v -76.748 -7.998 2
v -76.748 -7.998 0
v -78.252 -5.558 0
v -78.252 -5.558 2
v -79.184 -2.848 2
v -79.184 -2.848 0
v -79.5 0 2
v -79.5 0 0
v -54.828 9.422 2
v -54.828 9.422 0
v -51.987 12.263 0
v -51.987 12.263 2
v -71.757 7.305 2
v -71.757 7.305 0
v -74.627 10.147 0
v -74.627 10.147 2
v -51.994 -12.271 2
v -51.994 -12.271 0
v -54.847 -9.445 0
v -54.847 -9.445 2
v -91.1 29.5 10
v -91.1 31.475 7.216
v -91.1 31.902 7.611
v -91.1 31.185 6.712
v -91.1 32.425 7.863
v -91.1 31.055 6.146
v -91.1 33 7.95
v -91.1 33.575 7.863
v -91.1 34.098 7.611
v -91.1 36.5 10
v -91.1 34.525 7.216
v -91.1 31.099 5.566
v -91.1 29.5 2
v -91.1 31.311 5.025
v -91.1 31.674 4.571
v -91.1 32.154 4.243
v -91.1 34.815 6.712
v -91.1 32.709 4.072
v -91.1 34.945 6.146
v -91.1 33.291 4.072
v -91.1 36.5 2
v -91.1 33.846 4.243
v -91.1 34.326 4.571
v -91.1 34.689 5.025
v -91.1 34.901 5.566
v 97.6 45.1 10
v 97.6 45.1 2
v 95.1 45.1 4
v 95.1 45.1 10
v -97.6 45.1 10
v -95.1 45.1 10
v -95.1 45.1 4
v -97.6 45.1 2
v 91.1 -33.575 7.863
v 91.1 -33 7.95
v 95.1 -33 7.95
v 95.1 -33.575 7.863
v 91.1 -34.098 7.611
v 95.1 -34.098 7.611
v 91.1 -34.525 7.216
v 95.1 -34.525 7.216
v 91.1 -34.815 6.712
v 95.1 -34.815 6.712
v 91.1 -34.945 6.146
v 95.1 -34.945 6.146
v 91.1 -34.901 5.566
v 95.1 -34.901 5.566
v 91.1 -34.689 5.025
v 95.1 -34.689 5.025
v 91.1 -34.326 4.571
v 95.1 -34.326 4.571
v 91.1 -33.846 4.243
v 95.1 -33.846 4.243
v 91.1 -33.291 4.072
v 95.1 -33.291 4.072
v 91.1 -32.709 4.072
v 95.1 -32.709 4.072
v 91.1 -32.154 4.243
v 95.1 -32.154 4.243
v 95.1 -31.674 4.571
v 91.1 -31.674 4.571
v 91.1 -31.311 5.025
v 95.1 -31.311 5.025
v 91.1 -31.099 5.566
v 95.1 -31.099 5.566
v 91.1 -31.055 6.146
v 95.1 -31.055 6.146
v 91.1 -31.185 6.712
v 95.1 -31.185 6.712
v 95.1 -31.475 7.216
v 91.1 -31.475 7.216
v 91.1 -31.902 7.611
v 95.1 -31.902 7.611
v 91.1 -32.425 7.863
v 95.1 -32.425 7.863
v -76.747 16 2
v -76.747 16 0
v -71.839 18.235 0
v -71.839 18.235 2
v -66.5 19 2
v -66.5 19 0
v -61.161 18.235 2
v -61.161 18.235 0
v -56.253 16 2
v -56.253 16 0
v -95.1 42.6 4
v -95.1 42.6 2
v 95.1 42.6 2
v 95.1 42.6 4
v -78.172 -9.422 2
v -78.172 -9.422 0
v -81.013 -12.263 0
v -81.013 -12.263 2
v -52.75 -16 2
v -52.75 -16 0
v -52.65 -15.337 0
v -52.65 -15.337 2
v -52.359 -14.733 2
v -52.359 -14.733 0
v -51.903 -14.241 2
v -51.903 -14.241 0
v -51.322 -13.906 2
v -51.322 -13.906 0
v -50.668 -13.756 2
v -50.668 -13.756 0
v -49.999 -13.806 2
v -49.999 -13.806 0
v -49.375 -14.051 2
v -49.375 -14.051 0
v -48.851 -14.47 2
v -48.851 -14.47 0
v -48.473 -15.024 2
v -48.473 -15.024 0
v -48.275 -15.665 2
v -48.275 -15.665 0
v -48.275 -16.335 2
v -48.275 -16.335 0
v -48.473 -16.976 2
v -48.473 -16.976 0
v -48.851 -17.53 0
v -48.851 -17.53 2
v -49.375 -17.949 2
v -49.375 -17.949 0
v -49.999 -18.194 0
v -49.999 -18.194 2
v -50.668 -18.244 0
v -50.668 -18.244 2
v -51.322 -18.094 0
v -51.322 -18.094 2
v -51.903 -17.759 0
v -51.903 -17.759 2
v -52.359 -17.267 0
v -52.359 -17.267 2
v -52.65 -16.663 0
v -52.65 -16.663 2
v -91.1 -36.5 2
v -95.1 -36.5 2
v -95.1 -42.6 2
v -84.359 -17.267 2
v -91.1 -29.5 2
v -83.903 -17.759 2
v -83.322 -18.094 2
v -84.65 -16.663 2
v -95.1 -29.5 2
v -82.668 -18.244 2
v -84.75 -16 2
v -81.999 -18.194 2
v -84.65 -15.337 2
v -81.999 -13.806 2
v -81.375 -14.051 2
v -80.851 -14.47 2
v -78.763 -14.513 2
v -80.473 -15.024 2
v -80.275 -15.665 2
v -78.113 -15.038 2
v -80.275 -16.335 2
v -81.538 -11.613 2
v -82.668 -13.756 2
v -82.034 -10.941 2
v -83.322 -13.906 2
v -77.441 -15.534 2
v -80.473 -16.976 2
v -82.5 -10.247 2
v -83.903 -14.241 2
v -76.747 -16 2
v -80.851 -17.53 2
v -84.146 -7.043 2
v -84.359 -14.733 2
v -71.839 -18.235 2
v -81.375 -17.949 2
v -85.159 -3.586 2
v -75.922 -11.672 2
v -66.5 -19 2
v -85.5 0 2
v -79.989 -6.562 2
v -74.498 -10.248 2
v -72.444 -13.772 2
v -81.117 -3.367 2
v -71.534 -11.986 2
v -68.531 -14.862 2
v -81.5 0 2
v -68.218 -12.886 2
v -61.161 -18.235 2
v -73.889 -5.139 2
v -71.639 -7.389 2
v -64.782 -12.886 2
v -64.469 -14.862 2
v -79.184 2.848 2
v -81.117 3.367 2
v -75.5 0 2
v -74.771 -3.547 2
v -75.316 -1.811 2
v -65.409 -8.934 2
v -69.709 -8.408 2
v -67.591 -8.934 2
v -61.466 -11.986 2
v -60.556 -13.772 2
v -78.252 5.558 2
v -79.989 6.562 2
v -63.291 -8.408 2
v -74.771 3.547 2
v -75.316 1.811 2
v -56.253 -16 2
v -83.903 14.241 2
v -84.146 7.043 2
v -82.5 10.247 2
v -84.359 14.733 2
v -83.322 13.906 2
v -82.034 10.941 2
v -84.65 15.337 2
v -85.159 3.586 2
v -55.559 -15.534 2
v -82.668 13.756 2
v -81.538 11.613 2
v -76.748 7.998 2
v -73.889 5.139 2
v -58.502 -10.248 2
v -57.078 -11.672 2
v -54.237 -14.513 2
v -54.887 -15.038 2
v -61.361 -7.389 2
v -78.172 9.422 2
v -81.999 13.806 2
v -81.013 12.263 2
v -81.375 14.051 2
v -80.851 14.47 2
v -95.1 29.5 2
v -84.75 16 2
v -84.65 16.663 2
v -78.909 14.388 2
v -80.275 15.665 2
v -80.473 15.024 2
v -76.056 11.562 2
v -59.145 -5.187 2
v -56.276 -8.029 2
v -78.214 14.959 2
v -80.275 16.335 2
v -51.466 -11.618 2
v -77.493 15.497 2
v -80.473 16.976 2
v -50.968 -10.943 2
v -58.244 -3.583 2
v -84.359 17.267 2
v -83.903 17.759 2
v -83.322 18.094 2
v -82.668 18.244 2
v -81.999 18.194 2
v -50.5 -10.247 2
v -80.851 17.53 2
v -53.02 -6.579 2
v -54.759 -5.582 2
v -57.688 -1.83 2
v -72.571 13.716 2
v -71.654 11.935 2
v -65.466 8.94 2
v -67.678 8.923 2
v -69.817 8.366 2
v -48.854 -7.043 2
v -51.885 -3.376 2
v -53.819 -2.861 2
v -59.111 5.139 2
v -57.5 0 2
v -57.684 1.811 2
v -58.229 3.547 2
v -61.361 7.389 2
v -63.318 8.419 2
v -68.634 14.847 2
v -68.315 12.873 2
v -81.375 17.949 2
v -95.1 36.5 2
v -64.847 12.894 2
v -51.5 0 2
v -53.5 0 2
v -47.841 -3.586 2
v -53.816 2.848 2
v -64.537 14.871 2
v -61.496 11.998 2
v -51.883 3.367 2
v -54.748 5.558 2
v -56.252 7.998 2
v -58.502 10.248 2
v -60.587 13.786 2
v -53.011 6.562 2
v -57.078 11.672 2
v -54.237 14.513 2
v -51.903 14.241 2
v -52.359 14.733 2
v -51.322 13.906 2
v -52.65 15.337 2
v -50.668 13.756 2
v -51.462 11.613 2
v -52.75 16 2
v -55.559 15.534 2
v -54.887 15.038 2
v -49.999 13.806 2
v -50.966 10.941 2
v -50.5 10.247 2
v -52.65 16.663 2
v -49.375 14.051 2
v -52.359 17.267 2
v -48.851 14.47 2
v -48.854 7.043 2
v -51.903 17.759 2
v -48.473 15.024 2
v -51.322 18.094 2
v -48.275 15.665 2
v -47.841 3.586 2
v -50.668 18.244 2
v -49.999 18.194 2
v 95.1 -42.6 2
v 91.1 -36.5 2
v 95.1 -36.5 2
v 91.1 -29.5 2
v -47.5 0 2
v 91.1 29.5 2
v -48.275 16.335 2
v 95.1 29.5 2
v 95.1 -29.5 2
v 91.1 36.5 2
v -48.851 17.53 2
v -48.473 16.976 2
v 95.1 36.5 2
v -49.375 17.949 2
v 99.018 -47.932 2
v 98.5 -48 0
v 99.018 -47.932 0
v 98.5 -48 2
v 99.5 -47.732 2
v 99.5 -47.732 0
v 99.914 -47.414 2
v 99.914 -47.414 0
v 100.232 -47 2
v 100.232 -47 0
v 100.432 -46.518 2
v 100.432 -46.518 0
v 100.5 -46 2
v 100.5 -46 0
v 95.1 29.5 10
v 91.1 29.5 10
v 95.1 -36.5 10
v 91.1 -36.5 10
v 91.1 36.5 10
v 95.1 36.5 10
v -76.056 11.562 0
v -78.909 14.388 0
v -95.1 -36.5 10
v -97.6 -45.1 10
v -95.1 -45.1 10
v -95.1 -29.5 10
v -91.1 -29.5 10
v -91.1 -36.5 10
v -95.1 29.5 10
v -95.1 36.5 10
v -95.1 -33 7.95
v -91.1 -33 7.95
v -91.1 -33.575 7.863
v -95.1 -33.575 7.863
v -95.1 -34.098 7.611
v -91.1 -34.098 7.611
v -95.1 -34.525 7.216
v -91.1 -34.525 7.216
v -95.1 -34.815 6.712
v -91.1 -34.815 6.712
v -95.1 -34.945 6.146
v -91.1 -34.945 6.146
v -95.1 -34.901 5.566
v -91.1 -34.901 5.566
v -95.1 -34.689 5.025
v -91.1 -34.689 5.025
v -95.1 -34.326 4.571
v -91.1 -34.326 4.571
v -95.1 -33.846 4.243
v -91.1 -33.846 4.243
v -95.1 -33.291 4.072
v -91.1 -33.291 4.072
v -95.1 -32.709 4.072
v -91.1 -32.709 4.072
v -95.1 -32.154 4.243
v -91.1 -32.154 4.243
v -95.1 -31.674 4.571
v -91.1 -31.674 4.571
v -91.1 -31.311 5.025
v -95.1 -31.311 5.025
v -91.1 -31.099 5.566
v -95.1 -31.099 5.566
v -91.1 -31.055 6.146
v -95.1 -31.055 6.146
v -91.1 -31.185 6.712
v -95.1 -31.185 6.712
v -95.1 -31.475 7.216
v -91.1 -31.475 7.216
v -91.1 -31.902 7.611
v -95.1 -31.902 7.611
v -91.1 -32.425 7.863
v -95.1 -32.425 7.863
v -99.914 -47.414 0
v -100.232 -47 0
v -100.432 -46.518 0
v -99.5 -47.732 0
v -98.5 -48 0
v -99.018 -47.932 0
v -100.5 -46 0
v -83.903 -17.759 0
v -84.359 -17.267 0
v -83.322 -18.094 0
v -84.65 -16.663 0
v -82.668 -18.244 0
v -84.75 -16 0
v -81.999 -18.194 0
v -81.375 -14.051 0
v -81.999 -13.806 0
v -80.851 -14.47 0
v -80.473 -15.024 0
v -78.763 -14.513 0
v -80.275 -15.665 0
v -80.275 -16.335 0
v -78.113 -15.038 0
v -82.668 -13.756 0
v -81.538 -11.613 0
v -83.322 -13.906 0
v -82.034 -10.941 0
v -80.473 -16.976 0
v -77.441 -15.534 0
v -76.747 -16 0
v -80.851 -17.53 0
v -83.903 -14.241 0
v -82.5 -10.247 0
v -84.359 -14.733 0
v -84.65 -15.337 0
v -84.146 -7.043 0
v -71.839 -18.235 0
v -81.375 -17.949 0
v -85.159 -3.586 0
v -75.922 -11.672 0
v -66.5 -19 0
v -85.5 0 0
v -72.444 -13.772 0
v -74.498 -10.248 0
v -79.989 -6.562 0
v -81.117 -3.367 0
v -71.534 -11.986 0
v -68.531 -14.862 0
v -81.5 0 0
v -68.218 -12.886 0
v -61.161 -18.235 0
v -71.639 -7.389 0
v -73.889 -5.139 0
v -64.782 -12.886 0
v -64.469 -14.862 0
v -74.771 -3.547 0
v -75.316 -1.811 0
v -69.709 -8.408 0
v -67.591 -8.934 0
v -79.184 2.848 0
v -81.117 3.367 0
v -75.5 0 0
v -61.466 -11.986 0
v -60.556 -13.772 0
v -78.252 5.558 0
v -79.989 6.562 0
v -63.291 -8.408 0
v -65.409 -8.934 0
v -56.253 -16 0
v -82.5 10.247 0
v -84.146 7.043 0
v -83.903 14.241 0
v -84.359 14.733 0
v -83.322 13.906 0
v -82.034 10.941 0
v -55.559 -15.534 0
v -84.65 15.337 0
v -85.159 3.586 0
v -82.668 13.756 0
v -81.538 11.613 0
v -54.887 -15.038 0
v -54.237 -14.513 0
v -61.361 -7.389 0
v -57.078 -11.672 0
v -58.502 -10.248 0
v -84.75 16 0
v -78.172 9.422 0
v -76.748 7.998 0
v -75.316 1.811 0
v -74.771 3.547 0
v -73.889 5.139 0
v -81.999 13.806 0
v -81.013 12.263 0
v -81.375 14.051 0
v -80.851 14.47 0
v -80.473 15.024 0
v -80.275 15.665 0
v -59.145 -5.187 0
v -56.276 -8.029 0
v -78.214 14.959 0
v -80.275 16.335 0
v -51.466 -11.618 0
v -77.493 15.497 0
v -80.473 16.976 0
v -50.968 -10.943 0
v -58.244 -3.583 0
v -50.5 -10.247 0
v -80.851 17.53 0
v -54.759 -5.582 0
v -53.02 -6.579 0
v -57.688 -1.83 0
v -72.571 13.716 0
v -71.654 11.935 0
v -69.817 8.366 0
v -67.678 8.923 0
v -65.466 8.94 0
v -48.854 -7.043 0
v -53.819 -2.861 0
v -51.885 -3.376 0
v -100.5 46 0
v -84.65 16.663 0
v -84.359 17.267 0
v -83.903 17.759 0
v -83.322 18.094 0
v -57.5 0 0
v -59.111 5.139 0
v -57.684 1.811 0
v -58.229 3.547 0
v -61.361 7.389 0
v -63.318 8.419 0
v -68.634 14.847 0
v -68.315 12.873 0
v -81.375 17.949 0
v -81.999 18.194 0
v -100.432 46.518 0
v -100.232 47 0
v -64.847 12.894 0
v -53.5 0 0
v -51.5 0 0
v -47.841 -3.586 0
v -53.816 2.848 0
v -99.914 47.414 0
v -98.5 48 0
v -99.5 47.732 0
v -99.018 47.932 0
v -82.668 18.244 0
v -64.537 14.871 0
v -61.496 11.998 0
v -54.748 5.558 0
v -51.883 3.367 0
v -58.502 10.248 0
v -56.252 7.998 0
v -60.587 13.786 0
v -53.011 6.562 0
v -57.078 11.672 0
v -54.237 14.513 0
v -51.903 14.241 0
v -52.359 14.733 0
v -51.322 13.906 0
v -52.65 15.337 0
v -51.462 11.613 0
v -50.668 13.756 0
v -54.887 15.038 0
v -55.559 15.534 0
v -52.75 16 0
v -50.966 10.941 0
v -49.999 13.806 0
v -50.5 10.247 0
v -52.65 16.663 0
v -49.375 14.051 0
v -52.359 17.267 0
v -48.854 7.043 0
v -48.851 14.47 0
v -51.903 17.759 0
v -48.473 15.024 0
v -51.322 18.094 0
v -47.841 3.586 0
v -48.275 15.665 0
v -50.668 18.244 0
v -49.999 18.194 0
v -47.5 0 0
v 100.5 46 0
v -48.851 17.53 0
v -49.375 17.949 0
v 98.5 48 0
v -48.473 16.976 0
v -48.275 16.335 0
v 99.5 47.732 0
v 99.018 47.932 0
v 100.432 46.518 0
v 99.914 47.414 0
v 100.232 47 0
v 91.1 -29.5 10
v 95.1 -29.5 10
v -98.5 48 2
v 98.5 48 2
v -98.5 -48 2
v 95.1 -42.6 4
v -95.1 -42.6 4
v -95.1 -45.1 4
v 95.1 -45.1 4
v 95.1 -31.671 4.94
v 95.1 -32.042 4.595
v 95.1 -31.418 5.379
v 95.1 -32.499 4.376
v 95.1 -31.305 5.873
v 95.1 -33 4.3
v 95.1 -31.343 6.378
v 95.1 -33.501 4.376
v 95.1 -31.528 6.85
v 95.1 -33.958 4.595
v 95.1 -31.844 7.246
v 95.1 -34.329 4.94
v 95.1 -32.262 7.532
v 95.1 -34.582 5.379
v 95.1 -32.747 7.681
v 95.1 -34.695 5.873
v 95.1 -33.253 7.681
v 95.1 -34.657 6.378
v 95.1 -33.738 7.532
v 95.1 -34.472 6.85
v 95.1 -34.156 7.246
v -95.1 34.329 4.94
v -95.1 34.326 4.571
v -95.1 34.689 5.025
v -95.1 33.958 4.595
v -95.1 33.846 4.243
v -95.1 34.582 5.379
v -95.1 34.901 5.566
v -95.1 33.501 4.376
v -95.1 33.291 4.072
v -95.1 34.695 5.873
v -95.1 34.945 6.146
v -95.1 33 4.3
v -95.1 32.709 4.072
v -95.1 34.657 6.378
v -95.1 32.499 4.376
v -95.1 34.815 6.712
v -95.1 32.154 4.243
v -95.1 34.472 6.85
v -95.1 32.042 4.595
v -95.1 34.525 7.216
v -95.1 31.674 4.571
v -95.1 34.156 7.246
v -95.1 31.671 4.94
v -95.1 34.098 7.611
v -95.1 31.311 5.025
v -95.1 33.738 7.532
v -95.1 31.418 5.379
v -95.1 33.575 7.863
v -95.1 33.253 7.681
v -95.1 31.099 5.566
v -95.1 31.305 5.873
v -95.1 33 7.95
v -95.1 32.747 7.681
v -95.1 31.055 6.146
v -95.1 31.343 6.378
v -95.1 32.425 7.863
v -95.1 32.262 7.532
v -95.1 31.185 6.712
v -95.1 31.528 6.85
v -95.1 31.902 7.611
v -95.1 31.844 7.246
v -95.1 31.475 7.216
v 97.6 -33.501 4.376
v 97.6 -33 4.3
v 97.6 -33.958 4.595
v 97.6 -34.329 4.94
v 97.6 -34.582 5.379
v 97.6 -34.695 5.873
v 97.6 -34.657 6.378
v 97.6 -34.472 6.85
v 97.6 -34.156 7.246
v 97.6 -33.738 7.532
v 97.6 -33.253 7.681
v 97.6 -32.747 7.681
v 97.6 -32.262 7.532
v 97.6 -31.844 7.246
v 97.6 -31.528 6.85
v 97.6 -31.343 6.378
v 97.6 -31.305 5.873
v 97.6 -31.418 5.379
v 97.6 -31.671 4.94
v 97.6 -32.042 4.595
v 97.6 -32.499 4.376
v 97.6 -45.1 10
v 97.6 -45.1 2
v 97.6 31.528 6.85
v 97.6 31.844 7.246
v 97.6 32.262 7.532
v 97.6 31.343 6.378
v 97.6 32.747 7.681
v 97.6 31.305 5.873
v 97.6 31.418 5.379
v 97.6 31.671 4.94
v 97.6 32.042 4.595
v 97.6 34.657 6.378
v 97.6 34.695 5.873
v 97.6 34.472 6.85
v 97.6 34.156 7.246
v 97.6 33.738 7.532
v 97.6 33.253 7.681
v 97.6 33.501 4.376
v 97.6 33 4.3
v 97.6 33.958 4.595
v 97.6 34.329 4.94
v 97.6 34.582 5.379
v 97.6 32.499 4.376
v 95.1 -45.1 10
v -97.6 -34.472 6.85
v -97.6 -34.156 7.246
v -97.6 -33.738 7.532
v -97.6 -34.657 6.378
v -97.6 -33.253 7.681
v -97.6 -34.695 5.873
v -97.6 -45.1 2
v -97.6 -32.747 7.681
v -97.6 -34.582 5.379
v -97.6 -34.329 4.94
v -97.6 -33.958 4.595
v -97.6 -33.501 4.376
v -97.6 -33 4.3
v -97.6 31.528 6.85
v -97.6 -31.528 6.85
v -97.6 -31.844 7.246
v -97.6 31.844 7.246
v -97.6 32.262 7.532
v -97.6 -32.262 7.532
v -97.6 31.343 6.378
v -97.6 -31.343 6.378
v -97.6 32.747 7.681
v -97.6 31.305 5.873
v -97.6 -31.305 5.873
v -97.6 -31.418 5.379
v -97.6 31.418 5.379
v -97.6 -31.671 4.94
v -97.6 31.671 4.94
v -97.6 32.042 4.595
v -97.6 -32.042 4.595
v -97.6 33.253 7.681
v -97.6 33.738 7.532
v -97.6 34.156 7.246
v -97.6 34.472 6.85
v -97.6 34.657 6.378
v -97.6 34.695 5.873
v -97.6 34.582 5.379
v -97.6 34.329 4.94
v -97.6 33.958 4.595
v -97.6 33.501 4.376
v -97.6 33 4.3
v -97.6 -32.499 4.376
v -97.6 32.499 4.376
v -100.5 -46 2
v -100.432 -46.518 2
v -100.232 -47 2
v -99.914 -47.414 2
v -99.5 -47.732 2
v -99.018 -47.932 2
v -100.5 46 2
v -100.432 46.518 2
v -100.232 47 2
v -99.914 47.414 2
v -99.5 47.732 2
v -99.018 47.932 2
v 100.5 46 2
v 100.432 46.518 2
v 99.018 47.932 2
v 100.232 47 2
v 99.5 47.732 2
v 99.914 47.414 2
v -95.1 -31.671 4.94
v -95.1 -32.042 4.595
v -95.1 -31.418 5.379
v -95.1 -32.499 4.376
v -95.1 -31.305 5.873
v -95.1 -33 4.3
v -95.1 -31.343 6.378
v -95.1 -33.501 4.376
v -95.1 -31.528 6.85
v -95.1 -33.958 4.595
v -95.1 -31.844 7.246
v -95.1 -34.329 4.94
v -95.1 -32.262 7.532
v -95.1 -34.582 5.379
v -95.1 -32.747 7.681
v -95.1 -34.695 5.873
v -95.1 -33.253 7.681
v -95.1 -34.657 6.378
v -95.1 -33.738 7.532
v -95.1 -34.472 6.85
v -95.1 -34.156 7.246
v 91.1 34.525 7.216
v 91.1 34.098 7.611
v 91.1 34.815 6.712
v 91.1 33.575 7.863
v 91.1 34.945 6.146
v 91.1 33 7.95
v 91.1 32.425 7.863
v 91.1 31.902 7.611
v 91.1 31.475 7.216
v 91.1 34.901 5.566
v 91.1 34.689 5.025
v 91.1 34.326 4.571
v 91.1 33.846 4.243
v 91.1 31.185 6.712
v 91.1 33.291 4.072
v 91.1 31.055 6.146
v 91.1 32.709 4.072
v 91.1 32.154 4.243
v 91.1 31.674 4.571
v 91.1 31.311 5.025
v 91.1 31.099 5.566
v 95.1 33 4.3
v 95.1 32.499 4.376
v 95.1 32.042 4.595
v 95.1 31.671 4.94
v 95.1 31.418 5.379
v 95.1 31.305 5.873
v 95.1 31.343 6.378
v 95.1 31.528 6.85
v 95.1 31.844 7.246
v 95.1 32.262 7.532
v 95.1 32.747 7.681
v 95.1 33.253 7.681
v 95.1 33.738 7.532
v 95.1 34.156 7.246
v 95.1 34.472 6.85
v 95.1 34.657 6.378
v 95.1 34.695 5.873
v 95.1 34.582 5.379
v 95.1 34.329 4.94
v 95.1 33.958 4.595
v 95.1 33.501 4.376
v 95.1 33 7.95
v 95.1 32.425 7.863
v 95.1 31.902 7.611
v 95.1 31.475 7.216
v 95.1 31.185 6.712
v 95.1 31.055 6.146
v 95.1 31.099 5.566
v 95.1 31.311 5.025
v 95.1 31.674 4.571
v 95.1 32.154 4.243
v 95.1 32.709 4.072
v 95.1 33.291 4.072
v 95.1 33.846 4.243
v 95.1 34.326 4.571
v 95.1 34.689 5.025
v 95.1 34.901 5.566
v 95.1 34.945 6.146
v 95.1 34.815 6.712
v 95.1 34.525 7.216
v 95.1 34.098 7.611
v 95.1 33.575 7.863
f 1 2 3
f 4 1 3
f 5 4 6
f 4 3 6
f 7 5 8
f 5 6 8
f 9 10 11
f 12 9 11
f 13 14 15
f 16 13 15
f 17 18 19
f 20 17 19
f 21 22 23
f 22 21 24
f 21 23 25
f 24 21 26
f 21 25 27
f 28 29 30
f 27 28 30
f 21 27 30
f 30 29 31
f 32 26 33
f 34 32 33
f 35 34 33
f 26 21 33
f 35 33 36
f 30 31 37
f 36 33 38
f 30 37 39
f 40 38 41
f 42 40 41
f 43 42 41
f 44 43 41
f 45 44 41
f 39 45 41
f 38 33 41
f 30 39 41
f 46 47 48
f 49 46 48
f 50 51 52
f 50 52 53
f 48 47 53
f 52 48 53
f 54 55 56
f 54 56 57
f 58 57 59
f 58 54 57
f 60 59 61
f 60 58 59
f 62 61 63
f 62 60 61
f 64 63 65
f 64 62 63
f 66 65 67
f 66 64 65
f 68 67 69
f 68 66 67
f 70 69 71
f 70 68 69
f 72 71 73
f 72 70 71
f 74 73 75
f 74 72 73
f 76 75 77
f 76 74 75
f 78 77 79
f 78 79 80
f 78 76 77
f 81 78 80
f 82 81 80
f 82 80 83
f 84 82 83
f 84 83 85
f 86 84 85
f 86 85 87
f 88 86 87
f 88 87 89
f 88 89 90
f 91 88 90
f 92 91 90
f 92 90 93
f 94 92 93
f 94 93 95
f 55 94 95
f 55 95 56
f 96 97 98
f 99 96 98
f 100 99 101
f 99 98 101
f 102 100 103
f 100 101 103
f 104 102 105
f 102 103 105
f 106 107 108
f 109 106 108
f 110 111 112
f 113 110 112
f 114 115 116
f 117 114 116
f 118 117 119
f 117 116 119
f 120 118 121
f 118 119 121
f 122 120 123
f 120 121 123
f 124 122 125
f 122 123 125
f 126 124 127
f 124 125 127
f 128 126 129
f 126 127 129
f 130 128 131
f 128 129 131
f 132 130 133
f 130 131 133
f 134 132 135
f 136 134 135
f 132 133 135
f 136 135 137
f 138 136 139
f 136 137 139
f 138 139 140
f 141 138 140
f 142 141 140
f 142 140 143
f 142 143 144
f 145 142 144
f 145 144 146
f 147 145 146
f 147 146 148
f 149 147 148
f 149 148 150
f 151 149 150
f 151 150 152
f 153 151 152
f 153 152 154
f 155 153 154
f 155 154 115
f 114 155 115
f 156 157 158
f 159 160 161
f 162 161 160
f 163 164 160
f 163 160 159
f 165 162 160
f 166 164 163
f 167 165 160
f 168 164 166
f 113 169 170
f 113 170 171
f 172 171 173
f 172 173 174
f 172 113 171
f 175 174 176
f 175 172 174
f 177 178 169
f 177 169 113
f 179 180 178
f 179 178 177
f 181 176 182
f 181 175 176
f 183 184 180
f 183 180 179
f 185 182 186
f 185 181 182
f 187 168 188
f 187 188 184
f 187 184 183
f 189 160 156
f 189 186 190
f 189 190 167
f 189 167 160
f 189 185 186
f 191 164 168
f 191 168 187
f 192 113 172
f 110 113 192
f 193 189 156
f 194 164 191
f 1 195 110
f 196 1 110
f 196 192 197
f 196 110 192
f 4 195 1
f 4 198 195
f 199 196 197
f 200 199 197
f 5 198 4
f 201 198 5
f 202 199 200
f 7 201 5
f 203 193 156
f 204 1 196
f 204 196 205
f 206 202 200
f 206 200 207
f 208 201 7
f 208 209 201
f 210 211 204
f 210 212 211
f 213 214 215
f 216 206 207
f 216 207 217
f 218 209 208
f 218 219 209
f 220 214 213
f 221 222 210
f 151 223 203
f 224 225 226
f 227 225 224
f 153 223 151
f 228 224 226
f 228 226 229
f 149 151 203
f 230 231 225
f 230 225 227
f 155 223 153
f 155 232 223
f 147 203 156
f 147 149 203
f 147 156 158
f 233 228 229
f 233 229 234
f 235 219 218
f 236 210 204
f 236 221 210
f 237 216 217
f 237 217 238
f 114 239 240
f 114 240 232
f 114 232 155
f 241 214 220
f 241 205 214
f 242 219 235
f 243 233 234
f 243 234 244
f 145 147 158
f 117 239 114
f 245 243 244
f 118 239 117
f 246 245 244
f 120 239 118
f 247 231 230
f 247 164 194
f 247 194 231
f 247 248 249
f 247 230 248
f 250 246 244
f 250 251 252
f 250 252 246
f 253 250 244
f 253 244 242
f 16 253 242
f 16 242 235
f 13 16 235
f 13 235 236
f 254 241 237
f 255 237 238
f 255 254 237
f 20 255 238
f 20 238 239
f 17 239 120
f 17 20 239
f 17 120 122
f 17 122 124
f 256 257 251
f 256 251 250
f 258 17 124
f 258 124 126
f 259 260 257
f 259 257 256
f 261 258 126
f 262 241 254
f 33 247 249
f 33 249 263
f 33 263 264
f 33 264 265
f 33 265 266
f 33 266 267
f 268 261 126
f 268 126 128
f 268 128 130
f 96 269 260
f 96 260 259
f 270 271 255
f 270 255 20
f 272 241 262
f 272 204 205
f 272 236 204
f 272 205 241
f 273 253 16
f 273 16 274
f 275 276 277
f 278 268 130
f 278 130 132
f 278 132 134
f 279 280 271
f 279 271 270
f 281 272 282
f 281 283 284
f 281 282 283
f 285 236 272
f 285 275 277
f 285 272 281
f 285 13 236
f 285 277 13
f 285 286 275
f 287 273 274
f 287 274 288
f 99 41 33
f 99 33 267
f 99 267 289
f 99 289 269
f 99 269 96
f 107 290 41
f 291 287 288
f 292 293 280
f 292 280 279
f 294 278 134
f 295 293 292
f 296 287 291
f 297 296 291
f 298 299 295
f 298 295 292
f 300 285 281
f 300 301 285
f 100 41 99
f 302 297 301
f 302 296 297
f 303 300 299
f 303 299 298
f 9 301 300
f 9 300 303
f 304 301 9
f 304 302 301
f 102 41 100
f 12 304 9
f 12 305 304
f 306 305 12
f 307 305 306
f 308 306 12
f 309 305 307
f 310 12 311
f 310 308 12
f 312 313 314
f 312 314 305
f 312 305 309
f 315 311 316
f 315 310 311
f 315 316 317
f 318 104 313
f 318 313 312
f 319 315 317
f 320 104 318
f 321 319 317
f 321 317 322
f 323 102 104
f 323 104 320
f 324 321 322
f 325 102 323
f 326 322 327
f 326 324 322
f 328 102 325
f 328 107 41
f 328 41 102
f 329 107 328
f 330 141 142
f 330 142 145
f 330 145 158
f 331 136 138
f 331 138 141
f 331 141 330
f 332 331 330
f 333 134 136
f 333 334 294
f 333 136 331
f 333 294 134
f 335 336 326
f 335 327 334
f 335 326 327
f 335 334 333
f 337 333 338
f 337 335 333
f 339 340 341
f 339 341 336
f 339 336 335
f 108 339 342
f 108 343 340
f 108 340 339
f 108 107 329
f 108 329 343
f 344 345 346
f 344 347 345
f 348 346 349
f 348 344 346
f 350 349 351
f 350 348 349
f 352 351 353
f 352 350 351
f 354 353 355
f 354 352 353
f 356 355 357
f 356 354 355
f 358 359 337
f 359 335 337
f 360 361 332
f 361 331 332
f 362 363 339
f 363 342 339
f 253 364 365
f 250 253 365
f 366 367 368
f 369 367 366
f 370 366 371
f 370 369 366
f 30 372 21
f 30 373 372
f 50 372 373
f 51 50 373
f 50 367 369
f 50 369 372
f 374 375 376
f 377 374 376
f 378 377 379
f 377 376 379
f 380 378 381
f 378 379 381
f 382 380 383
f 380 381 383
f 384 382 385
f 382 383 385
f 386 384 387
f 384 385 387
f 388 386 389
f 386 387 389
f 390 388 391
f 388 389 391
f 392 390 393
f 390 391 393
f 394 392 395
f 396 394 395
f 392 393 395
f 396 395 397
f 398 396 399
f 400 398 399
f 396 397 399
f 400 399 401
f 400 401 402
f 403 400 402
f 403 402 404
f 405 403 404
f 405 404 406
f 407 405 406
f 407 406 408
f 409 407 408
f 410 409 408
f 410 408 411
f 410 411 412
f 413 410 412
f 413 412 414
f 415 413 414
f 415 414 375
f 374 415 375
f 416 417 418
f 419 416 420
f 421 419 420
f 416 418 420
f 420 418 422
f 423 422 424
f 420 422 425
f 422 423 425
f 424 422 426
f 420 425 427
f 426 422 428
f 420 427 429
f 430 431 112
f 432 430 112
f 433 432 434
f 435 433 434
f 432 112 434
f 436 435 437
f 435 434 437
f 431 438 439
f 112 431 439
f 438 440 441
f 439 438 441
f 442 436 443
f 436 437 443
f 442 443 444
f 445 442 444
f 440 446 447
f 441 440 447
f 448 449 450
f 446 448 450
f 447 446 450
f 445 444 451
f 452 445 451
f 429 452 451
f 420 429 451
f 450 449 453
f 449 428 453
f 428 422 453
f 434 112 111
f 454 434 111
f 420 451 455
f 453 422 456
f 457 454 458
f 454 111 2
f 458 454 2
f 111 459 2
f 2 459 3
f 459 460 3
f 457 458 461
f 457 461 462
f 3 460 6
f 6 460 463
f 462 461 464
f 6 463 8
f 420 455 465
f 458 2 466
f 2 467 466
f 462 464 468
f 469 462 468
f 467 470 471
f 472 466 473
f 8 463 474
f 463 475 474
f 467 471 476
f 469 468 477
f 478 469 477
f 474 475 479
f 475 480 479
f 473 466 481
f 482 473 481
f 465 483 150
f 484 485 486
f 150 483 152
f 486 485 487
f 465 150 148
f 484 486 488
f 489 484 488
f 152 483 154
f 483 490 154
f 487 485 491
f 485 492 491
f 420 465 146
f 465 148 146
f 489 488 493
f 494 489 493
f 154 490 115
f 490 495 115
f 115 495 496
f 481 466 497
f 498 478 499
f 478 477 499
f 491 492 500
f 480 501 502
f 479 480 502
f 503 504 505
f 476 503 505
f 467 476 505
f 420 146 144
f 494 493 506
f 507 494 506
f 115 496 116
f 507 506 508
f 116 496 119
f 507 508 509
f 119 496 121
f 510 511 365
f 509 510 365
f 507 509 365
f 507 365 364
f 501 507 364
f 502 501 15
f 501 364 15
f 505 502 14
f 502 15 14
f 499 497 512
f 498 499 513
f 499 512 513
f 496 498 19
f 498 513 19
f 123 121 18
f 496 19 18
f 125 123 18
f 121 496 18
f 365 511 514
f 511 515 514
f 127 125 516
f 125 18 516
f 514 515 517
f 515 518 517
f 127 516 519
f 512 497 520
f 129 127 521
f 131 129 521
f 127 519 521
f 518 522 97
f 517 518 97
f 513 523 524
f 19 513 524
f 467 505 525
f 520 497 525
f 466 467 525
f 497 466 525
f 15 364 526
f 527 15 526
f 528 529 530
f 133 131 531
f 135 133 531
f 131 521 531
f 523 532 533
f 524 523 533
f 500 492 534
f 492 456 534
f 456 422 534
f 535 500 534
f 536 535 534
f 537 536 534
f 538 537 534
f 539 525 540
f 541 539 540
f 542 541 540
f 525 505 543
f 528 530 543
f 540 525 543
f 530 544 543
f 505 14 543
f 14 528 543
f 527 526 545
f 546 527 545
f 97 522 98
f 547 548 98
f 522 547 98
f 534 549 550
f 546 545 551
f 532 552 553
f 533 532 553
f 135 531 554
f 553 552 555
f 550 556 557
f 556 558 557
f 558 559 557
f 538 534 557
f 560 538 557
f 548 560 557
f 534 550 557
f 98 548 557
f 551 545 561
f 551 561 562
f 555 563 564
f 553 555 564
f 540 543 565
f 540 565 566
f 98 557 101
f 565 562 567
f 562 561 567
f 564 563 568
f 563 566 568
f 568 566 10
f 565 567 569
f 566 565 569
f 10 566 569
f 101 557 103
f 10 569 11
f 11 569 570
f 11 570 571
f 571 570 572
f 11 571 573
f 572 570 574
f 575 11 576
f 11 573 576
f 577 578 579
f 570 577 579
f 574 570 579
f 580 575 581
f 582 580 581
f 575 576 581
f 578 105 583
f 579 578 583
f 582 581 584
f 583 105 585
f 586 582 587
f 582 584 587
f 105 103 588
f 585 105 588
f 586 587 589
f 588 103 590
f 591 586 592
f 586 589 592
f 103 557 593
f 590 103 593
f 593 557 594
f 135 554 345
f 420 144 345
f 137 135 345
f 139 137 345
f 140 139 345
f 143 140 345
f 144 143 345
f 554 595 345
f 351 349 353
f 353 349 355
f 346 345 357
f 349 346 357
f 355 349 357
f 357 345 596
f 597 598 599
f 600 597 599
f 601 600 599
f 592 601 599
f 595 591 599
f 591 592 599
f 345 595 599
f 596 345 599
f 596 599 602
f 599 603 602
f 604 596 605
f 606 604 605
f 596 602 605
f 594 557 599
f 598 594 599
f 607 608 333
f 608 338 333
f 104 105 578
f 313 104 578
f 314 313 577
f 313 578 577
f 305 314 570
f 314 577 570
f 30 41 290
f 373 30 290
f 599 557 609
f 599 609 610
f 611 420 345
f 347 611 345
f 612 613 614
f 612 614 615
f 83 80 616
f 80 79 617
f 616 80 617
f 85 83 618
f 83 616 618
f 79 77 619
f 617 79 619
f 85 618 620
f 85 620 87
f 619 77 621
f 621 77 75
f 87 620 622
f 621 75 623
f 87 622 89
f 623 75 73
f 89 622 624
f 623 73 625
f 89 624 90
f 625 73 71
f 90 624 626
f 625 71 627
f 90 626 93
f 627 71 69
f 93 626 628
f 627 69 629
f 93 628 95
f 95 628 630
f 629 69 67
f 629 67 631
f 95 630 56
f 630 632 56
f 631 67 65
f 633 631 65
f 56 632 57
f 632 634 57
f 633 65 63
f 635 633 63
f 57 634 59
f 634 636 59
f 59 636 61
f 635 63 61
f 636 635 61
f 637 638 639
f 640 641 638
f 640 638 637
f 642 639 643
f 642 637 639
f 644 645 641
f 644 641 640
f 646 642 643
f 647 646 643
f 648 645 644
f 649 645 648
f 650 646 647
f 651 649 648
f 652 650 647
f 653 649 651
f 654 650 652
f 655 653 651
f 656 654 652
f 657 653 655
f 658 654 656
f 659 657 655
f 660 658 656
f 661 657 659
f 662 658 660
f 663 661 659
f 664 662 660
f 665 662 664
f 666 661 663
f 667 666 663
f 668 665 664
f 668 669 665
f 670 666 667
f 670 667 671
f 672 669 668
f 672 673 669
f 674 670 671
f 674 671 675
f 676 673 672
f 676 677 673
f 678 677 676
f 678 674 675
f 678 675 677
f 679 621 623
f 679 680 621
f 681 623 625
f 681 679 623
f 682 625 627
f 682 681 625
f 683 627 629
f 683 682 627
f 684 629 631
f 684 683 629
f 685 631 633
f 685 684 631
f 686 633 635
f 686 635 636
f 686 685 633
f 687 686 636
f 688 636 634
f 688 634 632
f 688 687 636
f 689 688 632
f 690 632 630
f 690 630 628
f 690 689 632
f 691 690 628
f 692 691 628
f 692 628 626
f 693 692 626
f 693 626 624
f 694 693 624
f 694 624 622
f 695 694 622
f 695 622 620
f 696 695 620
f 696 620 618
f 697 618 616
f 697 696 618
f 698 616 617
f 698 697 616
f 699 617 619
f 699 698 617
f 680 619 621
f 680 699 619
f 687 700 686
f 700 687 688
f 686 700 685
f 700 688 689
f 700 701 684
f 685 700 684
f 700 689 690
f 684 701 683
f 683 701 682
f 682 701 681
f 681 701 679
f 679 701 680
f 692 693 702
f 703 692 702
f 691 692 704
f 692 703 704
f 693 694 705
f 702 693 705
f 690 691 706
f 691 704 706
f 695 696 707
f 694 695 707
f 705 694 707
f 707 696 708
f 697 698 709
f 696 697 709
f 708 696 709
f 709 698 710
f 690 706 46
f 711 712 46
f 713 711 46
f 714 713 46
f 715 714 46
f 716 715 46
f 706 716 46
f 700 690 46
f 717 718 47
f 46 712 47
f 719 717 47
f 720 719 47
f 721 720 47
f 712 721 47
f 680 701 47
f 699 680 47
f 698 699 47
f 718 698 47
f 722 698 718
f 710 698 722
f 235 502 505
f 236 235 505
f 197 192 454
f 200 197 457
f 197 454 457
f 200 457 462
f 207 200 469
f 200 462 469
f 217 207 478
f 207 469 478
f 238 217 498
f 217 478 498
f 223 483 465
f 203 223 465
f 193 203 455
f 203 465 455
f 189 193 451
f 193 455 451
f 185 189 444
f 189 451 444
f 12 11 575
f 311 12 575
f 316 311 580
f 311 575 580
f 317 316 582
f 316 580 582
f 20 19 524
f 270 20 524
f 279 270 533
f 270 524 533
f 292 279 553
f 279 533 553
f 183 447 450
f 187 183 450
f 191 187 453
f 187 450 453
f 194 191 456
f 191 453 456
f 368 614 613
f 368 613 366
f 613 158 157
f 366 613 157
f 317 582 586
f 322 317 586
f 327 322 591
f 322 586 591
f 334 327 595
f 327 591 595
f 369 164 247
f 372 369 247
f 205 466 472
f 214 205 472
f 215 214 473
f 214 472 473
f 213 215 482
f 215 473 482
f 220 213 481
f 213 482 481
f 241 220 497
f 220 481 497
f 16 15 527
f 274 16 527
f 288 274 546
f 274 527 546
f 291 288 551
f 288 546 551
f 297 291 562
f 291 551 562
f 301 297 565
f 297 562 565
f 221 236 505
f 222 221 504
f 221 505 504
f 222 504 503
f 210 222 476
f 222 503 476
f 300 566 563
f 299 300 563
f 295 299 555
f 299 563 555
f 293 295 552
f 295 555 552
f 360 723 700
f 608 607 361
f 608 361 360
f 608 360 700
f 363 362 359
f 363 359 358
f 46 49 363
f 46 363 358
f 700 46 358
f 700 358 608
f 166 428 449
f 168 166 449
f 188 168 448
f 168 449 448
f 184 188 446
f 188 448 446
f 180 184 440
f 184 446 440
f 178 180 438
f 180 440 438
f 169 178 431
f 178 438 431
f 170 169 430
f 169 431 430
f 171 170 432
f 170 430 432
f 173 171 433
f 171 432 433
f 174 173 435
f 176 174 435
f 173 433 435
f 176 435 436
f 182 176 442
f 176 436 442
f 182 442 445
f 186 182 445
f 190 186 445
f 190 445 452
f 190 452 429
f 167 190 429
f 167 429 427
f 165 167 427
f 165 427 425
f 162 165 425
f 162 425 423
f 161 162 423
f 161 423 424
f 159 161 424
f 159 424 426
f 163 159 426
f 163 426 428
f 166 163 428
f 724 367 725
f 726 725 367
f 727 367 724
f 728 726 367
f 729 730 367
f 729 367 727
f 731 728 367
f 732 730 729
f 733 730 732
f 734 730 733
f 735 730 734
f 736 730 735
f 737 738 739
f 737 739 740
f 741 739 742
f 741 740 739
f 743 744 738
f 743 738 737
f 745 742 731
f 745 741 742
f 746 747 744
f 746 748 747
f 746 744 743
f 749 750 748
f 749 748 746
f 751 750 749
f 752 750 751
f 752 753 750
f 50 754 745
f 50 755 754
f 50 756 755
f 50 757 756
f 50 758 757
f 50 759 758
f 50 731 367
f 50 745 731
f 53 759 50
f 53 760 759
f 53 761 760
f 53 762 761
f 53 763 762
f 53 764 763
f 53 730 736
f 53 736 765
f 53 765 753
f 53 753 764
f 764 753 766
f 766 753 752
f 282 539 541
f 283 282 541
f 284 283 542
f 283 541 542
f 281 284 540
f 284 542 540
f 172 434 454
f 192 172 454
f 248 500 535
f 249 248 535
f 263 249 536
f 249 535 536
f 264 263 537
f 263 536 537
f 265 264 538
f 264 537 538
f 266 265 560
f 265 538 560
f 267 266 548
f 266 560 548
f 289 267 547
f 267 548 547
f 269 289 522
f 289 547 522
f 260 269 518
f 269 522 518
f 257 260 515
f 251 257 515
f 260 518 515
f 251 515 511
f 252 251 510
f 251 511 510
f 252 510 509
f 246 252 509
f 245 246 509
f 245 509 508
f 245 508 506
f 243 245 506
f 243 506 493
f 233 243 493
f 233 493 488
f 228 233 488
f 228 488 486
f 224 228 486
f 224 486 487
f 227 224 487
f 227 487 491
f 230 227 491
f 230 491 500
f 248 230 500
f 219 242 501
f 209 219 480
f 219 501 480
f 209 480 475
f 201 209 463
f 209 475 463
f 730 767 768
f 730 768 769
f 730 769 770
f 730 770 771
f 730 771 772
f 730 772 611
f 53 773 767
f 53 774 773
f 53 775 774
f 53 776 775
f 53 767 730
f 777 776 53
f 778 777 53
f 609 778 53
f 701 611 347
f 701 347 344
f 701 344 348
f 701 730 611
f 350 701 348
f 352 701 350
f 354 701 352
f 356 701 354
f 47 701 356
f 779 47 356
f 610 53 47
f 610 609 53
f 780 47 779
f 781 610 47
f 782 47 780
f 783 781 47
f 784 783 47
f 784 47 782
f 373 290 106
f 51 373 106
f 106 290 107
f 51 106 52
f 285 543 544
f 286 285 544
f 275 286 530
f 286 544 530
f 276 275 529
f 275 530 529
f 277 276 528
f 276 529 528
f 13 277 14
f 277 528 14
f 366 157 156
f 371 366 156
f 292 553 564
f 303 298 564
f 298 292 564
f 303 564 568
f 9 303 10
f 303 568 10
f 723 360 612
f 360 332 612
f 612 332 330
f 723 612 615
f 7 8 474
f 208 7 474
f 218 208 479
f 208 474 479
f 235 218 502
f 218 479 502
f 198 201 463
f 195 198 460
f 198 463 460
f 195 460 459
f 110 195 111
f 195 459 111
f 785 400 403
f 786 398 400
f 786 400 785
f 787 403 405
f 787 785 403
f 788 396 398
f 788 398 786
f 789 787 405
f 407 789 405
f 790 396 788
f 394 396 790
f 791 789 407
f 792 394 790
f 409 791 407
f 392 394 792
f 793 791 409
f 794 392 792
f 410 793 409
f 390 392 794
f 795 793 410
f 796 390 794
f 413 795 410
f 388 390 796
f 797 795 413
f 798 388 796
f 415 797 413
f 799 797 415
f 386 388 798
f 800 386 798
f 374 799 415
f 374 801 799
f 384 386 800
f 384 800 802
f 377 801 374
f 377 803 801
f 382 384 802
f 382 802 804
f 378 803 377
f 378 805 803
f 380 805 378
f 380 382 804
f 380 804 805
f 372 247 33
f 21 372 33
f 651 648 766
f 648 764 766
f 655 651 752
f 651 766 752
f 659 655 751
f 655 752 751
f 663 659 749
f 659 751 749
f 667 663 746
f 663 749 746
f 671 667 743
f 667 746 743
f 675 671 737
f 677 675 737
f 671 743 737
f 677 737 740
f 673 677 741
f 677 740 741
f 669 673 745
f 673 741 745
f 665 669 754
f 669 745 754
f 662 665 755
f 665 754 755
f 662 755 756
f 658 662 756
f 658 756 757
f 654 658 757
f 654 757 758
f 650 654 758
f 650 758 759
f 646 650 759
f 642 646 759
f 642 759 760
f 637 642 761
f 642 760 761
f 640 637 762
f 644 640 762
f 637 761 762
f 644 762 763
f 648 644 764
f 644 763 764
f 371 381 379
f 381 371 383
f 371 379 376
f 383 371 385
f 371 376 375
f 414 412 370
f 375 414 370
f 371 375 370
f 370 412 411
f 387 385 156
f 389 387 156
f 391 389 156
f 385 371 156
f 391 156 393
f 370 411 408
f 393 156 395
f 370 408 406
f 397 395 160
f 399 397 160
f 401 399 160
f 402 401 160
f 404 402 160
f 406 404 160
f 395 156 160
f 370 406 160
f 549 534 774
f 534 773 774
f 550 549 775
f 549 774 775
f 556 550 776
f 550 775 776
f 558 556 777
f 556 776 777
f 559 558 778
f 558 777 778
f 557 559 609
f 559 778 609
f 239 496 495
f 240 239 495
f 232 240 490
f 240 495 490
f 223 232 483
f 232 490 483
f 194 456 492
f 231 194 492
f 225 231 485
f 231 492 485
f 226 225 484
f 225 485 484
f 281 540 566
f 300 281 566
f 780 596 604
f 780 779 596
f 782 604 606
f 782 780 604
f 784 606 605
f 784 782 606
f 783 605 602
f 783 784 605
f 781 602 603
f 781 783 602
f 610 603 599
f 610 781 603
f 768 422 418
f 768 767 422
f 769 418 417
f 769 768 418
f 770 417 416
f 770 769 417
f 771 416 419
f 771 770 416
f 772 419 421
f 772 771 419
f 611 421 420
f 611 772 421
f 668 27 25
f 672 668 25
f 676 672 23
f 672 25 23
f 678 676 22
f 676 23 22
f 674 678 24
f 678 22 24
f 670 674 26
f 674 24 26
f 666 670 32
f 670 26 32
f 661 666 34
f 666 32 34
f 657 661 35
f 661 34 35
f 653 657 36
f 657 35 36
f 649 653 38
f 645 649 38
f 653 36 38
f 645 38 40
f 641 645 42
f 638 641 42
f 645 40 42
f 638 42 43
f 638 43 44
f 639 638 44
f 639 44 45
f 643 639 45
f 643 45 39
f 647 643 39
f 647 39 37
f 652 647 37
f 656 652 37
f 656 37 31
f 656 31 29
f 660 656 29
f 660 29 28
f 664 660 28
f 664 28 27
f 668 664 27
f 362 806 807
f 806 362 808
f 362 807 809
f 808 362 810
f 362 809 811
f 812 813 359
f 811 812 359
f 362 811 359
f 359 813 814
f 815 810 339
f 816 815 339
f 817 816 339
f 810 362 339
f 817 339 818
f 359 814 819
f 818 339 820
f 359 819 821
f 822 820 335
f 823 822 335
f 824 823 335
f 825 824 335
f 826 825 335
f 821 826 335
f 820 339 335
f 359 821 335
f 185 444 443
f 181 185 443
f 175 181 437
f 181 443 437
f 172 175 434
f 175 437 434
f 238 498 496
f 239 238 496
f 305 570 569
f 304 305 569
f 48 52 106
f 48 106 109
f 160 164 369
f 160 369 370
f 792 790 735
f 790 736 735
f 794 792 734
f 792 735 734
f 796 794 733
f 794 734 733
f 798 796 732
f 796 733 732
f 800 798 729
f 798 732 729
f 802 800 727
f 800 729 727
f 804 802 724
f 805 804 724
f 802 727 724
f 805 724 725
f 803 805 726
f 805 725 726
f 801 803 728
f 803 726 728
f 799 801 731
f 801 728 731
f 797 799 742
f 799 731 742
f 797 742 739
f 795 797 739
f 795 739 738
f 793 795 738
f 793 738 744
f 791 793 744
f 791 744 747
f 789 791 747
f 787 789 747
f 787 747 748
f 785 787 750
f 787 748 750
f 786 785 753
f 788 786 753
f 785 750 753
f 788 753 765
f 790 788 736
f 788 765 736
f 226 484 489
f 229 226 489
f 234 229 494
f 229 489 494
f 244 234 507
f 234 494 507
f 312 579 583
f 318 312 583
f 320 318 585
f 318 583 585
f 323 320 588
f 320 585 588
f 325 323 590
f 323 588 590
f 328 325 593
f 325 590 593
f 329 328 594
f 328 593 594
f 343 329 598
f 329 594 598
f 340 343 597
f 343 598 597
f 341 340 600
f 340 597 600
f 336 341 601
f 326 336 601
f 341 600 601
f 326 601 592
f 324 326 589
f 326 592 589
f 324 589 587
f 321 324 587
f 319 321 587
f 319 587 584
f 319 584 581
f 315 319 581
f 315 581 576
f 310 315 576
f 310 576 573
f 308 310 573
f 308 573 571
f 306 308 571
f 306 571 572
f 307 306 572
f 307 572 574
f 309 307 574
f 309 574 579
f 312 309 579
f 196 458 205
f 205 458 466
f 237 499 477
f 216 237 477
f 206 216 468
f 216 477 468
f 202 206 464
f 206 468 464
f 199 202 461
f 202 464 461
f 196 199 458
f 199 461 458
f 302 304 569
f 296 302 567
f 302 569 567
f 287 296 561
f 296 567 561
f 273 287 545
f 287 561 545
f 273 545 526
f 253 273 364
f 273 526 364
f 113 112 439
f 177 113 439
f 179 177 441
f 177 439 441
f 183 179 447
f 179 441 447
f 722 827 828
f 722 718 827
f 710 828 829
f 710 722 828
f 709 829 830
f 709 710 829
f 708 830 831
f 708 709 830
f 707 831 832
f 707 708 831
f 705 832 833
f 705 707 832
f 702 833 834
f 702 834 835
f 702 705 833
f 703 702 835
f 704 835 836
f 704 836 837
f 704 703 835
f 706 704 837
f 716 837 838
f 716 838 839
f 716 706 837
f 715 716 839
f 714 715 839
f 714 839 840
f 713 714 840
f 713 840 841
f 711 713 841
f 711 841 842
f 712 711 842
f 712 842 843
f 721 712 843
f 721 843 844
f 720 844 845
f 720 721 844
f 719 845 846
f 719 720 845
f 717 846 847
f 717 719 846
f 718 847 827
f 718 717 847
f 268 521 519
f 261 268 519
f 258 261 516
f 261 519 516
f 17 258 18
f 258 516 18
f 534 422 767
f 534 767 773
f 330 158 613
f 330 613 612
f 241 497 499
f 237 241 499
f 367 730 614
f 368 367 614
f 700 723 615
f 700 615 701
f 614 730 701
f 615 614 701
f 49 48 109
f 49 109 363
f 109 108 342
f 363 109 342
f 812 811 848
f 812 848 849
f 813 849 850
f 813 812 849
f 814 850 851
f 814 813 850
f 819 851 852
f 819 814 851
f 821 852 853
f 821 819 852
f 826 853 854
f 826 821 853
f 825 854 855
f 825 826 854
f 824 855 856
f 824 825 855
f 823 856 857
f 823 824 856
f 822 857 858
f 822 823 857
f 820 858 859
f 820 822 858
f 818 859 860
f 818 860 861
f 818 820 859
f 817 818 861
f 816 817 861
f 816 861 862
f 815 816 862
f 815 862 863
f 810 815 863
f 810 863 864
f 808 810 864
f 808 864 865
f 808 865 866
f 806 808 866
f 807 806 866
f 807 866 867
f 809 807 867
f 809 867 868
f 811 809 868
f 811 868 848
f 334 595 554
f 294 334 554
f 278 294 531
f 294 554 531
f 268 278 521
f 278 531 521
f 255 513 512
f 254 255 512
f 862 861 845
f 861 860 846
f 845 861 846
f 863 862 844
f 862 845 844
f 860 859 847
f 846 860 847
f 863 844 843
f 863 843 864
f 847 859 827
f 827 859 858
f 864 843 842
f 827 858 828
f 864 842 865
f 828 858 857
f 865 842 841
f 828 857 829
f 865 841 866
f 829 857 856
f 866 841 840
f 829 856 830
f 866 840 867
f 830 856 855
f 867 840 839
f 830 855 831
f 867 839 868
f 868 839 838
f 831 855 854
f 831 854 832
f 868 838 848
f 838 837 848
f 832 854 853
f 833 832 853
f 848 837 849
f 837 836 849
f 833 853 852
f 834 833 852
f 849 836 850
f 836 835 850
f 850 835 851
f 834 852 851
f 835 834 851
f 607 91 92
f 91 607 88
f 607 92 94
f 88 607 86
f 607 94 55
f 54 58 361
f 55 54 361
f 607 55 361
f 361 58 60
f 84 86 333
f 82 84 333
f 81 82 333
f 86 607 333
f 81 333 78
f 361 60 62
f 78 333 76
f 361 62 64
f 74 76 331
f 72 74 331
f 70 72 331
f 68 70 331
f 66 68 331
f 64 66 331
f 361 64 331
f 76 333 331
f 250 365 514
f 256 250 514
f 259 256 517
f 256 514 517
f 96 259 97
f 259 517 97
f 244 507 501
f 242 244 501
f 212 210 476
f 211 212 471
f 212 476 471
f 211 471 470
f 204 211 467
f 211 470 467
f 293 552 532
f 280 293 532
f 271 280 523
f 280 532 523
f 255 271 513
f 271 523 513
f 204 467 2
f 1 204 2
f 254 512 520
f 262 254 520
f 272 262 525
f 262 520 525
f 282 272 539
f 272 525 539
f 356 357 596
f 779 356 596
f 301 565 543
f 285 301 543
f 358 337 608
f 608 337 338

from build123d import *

# Parameters (mm, degrees)
P_DORYS_W                                         = 201
P_DORYS_H                                         = 96
P_IDAT_VYSUNUT_M1_DEPTH                           = 2
ZAOBLIT1_R                                        = 2
SKICA2_W                                          = 195.2
SKICA2_H                                          = 90.2
SKICA2_W_2                                        = 190.2
SKICA2_H_2                                        = 85.2
SKICA2_W_3                                        = 4
SKICA2_H_3                                        = 7
P_IDAT_VYSUNUT_M2_DEPTH                           = 2
P_IDAT_VYSUNUT_M3_DEPTH                           = 6
V_LCOV_ZAHLOUBEN_PRO_M6_ROUBY_S_V_LCO_D           = 3.4
V_LCOV_ZAHLOUBEN_PRO_M6_ROUBY_S_V_LCO_DEPTH       = 9.4
V_LCOV_ZAHLOUBEN_PRO_M6_ROUBY_S_V_LCO_CBORE_D     = 3.9
V_LCOV_ZAHLOUBEN_PRO_M6_ROUBY_S_V_LCO_CBORE_DEPTH = 4
SKICA7_R                                          = 2.25
ODEBRAT_VYSUNUT_M1_DEPTH                          = 6


with BuildPart() as part:
    # půdorys → Přidat vysunutím1 (new body)
    with BuildSketch(Plane.XY):
        Rectangle(P_DORYS_W, P_DORYS_H)
    extrude(amount=P_IDAT_VYSUNUT_M1_DEPTH)

    # Zaoblit1
    zaoblit1_edges = [part.edges().sort_by_distance(p)[0] for p in [
        (100.5, -48, 1),
        (-100.5, -48, 1),
        (-100.5, 48, 1),
        (100.5, 48, 1),
    ]]
    fillet(zaoblit1_edges, radius=ZAOBLIT1_R)

    # Skica2 → Přidat vysunutím2 (add)
    # profile 1 of 5: a face of its own
    with BuildSketch(Plane.XY.offset(2)):
        Rectangle(SKICA2_W, SKICA2_H)
        Rectangle(SKICA2_W_2, SKICA2_H_2, mode=Mode.SUBTRACT)
    # profile 2 of 5: a face of its own
    with BuildSketch(Plane.XY.offset(2)):
        with Locations((93.1, -33)):
            Rectangle(SKICA2_W_3, SKICA2_H_3)
    # profile 3 of 5: a face of its own
    with BuildSketch(Plane.XY.offset(2)):
        with Locations((93.1, 33)):
            Rectangle(SKICA2_W_3, SKICA2_H_3)
    # profile 4 of 5: a face of its own
    with BuildSketch(Plane.XY.offset(2)):
        with Locations((-93.1, 33)):
            Rectangle(SKICA2_W_3, SKICA2_H_3)
    # profile 5 of 5: a face of its own
    with BuildSketch(Plane.XY.offset(2)):
        with Locations((-93.1, -33)):
            Rectangle(SKICA2_W_3, SKICA2_H_3)
    extrude(amount=P_IDAT_VYSUNUT_M2_DEPTH)

    # Skica3 → Přidat vysunutím3 (add)
    with BuildSketch(Plane.XY.offset(4)):
        Polygon((95.1, 45.1), (95.1, 36.5), (91.1, 36.5), (91.1, 29.5), (95.1, 29.5), (95.1, -29.5), (91.1, -29.5), (91.1, -36.5), (95.1, -36.5), (95.1, -45.1), (97.6, -45.1), (97.6, 45.1), align=None)
        Polygon((-95.1, -45.1), (-95.1, -36.5), (-91.1, -36.5), (-91.1, -29.5), (-95.1, -29.5), (-95.1, 29.5), (-91.1, 29.5), (-91.1, 36.5), (-95.1, 36.5), (-95.1, 45.1), (-97.6, 45.1), (-97.6, -45.1), align=None)
    extrude(amount=P_IDAT_VYSUNUT_M3_DEPTH)

    # Válcové zahloubení pro M6 šrouby s válcovou hlavou zaoblenou1
    with Locations(Plane(origin=(-91.1, 33, 6), x_dir=(0, 0, 1), z_dir=(1, 0, 0))):
        with Locations((0, 0), (0, 66)):
            v_lcov_zahlouben_pro_m6_rouby_s_v_lco = CounterBoreHole(V_LCOV_ZAHLOUBEN_PRO_M6_ROUBY_S_V_LCO_D / 2, V_LCOV_ZAHLOUBEN_PRO_M6_ROUBY_S_V_LCO_CBORE_D / 2, V_LCOV_ZAHLOUBEN_PRO_M6_ROUBY_S_V_LCO_CBORE_DEPTH, depth=V_LCOV_ZAHLOUBEN_PRO_M6_ROUBY_S_V_LCO_DEPTH)

    # Zrcadlit1: Válcové zahloubení pro M6 šrouby s válcovou hlavou zaoblenou1 across plane
    add(v_lcov_zahlouben_pro_m6_rouby_s_v_lco.mirror(Plane(origin=(0, 0, 0), x_dir=(0, 0, 1), z_dir=(1, 0, 0))), mode=Mode.SUBTRACT)

    # Skica7 → Odebrat vysunutím1 (cut)
    with BuildSketch(Plane(origin=(0, 0, 0), x_dir=(-1, 0, 0), z_dir=(0, 0, -1))):
        with BuildLine():
            Line((82.5, 10.246950766), (82.5, 0))
            Line((82.5, 0), (85.5, 0))
            ThreePointArc((85.5, 0), (84.734582529, 5.338539126), (82.5, 10.246950766))
        make_face()
        with BuildLine():
            Line((85.5, 0), (82.5, 0))
            Line((82.5, 0), (82.5, -10.246950766))
            ThreePointArc((82.5, -10.246950766), (84.734582529, -5.338539126), (85.5, 0))
        make_face()
        with BuildLine():
            ThreePointArc((78.171770833, 9.421770833), (80.643489005, 4.996170409), (81.5, 0))
            Line((81.5, 0), (82.5, 0))
            Line((82.5, 0), (82.5, 10.246950766))
            ThreePointArc((82.5, 10.246950766), (81.789681929, 11.279433784), (81.0128443, 12.2628443))
            Line((81.0128443, 12.2628443), (78.171770833, 9.421770833))
        make_face()
        with BuildLine():
            ThreePointArc((57.078229167, 11.671770833), (66.586420622, 14.999751047), (76.055634012, 11.562433076))
            Line((76.055634012, 11.562433076), (78.908692733, 14.38834058))
            ThreePointArc((78.908692733, 14.38834058), (77.856447821, 15.232566852), (76.746950766, 16))
            Line((76.746950766, 16), (56.253049234, 16))
            ThreePointArc((56.253049234, 16), (55.220566216, 15.289681929), (54.2371557, 14.5128443))
            Line((54.2371557, 14.5128443), (57.078229167, 11.671770833))
        make_face()
        with BuildLine():
            Line((56.253049234, 16), (76.746950766, 16))
            ThreePointArc((76.746950766, 16), (66.5, 19), (56.253049234, 16))
        make_face()
        with BuildLine():
            ThreePointArc((51.5, 0), (52.356510995, 4.996170409), (54.828229167, 9.421770833))
            Line((54.828229167, 9.421770833), (51.9871557, 12.2628443))
            ThreePointArc((51.9871557, 12.2628443), (51.210318071, 11.279433784), (50.5, 10.246950766))
            Line((50.5, 10.246950766), (50.5, 0))
            Line((50.5, 0), (51.5, 0))
        make_face()
        with BuildLine():
            Line((50.5, 0), (50.5, 10.246950766))
            ThreePointArc((50.5, 10.246950766), (48.265417471, 5.338539126), (47.5, 0))
            Line((47.5, 0), (50.5, 0))
        make_face()
        with BuildLine():
            Line((50.5, -10.246950766), (50.5, 0))
            Line((50.5, 0), (47.5, 0))
            ThreePointArc((47.5, 0), (48.265417471, -5.338539126), (50.5, -10.246950766))
        make_face()
        with BuildLine():
            Line((51.993667632, -12.2705469), (54.846726353, -9.444639395))
            ThreePointArc((54.846726353, -9.444639395), (52.361416183, -5.010034695), (51.5, 0))
            Line((51.5, 0), (50.5, 0))
            Line((50.5, 0), (50.5, -10.246950766))
            ThreePointArc((50.5, -10.246950766), (51.213312525, -11.283491748), (51.993667632, -12.2705469))
        make_face()
        with BuildLine():
            Line((78.7628443, -14.5128443), (75.921770833, -11.671770833))
            ThreePointArc((75.921770833, -11.671770833), (66.5, -15), (57.078229167, -11.671770833))
            Line((57.078229167, -11.671770833), (54.2371557, -14.5128443))
            ThreePointArc((54.2371557, -14.5128443), (55.220566216, -15.289681929), (56.253049234, -16))
            Line((56.253049234, -16), (76.746950766, -16))
            ThreePointArc((76.746950766, -16), (77.779433784, -15.289681929), (78.7628443, -14.5128443))
        make_face()
        with BuildLine():
            ThreePointArc((56.253049234, -16), (66.5, -19), (76.746950766, -16))
            Line((76.746950766, -16), (56.253049234, -16))
        make_face()
        with BuildLine():
            Line((82.5, 0), (81.5, 0))
            ThreePointArc((81.5, 0), (80.643489005, -4.996170409), (78.171770833, -9.421770833))
            Line((78.171770833, -9.421770833), (81.0128443, -12.2628443))
            ThreePointArc((81.0128443, -12.2628443), (81.789681929, -11.279433784), (82.5, -10.246950766))
            Line((82.5, -10.246950766), (82.5, 0))
        make_face()
        with BuildLine():
            ThreePointArc((76.748287511, -7.998287511), (78.792838111, -4.229199828), (79.5, 0))
            Line((79.5, 0), (75.5, 0))
            ThreePointArc((75.5, 0), (75.087741676, -2.692711071), (73.888734908, -5.138734908))
            Line((73.888734908, -5.138734908), (76.748287511, -7.998287511))
        make_face()
        with BuildLine():
            ThreePointArc((58.501712489, -10.248287511), (66.5, -13), (74.498287511, -10.248287511))
            Line((74.498287511, -10.248287511), (71.638734908, -7.388734908))
            ThreePointArc((71.638734908, -7.388734908), (66.5, -9), (61.361265092, -7.388734908))
            Line((61.361265092, -7.388734908), (58.501712489, -10.248287511))
        make_face()
        with BuildLine():
            ThreePointArc((53.5, 0), (54.213544679, -4.247707105), (56.275848561, -8.02911747))
            Line((56.275848561, -8.02911747), (59.145152054, -5.187119788))
            ThreePointArc((59.145152054, -5.187119788), (57.921141349, -2.720879314), (57.5, 0))
            Line((57.5, 0), (53.5, 0))
        make_face()
        with BuildLine():
            Line((59.111265092, 5.138734908), (56.251712489, 7.998287511))
            ThreePointArc((56.251712489, 7.998287511), (54.207161889, 4.229199828), (53.5, 0))
            Line((53.5, 0), (57.5, 0))
            ThreePointArc((57.5, 0), (57.912258324, 2.692711071), (59.111265092, 5.138734908))
        make_face()
        with BuildLine():
            Line((71.757208311, 7.304913468), (74.626511804, 10.146911151))
            ThreePointArc((74.626511804, 10.146911151), (66.581729181, 12.999743088), (58.501712489, 10.248287511))
            Line((58.501712489, 10.248287511), (61.361265092, 7.388734908))
            ThreePointArc((61.361265092, 7.388734908), (66.572563732, 8.999707468), (71.757208311, 7.304913468))
        make_face()
        with BuildLine():
            Line((75.5, 0), (79.5, 0))
            ThreePointArc((79.5, 0), (78.792838111, 4.229199828), (76.748287511, 7.998287511))
            Line((76.748287511, 7.998287511), (73.888734908, 5.138734908))
            ThreePointArc((73.888734908, 5.138734908), (75.087741676, 2.692711071), (75.5, 0))
        make_face()
        with Locations((50.5, -16)):
            Circle(SKICA7_R)
        with Locations((82.5, -16)):
            Circle(SKICA7_R)
        with Locations((82.5, 16)):
            Circle(SKICA7_R)
        with Locations((50.5, 16)):
            Circle(SKICA7_R)
    extrude(amount=-ODEBRAT_VYSUNUT_M1_DEPTH, mode=Mode.SUBTRACT)


solid = part.part
